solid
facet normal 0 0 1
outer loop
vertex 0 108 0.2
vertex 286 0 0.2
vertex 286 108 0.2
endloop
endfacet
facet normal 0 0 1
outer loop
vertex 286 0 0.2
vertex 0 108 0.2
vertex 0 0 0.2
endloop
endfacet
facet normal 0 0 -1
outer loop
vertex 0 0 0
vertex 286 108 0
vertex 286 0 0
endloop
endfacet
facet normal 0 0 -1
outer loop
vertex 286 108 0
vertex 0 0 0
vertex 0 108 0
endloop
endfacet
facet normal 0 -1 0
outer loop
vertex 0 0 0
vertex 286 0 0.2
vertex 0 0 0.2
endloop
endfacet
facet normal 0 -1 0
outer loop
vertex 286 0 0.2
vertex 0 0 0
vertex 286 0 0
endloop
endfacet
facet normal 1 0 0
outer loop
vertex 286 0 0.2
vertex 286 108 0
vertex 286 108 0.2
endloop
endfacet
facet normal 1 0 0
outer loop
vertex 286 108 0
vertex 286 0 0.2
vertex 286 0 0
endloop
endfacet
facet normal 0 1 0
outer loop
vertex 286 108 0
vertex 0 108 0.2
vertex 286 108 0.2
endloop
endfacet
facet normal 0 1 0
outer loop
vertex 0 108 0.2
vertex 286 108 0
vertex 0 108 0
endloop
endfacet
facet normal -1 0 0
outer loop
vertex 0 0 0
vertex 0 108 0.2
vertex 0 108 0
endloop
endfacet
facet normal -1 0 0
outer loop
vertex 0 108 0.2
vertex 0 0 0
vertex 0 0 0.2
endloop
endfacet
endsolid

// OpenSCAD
$fa=4; $fs=0.4;
color("#000000") translate([0.000,0.000,0.000]) cube([286.000,108.000,0.200]);
